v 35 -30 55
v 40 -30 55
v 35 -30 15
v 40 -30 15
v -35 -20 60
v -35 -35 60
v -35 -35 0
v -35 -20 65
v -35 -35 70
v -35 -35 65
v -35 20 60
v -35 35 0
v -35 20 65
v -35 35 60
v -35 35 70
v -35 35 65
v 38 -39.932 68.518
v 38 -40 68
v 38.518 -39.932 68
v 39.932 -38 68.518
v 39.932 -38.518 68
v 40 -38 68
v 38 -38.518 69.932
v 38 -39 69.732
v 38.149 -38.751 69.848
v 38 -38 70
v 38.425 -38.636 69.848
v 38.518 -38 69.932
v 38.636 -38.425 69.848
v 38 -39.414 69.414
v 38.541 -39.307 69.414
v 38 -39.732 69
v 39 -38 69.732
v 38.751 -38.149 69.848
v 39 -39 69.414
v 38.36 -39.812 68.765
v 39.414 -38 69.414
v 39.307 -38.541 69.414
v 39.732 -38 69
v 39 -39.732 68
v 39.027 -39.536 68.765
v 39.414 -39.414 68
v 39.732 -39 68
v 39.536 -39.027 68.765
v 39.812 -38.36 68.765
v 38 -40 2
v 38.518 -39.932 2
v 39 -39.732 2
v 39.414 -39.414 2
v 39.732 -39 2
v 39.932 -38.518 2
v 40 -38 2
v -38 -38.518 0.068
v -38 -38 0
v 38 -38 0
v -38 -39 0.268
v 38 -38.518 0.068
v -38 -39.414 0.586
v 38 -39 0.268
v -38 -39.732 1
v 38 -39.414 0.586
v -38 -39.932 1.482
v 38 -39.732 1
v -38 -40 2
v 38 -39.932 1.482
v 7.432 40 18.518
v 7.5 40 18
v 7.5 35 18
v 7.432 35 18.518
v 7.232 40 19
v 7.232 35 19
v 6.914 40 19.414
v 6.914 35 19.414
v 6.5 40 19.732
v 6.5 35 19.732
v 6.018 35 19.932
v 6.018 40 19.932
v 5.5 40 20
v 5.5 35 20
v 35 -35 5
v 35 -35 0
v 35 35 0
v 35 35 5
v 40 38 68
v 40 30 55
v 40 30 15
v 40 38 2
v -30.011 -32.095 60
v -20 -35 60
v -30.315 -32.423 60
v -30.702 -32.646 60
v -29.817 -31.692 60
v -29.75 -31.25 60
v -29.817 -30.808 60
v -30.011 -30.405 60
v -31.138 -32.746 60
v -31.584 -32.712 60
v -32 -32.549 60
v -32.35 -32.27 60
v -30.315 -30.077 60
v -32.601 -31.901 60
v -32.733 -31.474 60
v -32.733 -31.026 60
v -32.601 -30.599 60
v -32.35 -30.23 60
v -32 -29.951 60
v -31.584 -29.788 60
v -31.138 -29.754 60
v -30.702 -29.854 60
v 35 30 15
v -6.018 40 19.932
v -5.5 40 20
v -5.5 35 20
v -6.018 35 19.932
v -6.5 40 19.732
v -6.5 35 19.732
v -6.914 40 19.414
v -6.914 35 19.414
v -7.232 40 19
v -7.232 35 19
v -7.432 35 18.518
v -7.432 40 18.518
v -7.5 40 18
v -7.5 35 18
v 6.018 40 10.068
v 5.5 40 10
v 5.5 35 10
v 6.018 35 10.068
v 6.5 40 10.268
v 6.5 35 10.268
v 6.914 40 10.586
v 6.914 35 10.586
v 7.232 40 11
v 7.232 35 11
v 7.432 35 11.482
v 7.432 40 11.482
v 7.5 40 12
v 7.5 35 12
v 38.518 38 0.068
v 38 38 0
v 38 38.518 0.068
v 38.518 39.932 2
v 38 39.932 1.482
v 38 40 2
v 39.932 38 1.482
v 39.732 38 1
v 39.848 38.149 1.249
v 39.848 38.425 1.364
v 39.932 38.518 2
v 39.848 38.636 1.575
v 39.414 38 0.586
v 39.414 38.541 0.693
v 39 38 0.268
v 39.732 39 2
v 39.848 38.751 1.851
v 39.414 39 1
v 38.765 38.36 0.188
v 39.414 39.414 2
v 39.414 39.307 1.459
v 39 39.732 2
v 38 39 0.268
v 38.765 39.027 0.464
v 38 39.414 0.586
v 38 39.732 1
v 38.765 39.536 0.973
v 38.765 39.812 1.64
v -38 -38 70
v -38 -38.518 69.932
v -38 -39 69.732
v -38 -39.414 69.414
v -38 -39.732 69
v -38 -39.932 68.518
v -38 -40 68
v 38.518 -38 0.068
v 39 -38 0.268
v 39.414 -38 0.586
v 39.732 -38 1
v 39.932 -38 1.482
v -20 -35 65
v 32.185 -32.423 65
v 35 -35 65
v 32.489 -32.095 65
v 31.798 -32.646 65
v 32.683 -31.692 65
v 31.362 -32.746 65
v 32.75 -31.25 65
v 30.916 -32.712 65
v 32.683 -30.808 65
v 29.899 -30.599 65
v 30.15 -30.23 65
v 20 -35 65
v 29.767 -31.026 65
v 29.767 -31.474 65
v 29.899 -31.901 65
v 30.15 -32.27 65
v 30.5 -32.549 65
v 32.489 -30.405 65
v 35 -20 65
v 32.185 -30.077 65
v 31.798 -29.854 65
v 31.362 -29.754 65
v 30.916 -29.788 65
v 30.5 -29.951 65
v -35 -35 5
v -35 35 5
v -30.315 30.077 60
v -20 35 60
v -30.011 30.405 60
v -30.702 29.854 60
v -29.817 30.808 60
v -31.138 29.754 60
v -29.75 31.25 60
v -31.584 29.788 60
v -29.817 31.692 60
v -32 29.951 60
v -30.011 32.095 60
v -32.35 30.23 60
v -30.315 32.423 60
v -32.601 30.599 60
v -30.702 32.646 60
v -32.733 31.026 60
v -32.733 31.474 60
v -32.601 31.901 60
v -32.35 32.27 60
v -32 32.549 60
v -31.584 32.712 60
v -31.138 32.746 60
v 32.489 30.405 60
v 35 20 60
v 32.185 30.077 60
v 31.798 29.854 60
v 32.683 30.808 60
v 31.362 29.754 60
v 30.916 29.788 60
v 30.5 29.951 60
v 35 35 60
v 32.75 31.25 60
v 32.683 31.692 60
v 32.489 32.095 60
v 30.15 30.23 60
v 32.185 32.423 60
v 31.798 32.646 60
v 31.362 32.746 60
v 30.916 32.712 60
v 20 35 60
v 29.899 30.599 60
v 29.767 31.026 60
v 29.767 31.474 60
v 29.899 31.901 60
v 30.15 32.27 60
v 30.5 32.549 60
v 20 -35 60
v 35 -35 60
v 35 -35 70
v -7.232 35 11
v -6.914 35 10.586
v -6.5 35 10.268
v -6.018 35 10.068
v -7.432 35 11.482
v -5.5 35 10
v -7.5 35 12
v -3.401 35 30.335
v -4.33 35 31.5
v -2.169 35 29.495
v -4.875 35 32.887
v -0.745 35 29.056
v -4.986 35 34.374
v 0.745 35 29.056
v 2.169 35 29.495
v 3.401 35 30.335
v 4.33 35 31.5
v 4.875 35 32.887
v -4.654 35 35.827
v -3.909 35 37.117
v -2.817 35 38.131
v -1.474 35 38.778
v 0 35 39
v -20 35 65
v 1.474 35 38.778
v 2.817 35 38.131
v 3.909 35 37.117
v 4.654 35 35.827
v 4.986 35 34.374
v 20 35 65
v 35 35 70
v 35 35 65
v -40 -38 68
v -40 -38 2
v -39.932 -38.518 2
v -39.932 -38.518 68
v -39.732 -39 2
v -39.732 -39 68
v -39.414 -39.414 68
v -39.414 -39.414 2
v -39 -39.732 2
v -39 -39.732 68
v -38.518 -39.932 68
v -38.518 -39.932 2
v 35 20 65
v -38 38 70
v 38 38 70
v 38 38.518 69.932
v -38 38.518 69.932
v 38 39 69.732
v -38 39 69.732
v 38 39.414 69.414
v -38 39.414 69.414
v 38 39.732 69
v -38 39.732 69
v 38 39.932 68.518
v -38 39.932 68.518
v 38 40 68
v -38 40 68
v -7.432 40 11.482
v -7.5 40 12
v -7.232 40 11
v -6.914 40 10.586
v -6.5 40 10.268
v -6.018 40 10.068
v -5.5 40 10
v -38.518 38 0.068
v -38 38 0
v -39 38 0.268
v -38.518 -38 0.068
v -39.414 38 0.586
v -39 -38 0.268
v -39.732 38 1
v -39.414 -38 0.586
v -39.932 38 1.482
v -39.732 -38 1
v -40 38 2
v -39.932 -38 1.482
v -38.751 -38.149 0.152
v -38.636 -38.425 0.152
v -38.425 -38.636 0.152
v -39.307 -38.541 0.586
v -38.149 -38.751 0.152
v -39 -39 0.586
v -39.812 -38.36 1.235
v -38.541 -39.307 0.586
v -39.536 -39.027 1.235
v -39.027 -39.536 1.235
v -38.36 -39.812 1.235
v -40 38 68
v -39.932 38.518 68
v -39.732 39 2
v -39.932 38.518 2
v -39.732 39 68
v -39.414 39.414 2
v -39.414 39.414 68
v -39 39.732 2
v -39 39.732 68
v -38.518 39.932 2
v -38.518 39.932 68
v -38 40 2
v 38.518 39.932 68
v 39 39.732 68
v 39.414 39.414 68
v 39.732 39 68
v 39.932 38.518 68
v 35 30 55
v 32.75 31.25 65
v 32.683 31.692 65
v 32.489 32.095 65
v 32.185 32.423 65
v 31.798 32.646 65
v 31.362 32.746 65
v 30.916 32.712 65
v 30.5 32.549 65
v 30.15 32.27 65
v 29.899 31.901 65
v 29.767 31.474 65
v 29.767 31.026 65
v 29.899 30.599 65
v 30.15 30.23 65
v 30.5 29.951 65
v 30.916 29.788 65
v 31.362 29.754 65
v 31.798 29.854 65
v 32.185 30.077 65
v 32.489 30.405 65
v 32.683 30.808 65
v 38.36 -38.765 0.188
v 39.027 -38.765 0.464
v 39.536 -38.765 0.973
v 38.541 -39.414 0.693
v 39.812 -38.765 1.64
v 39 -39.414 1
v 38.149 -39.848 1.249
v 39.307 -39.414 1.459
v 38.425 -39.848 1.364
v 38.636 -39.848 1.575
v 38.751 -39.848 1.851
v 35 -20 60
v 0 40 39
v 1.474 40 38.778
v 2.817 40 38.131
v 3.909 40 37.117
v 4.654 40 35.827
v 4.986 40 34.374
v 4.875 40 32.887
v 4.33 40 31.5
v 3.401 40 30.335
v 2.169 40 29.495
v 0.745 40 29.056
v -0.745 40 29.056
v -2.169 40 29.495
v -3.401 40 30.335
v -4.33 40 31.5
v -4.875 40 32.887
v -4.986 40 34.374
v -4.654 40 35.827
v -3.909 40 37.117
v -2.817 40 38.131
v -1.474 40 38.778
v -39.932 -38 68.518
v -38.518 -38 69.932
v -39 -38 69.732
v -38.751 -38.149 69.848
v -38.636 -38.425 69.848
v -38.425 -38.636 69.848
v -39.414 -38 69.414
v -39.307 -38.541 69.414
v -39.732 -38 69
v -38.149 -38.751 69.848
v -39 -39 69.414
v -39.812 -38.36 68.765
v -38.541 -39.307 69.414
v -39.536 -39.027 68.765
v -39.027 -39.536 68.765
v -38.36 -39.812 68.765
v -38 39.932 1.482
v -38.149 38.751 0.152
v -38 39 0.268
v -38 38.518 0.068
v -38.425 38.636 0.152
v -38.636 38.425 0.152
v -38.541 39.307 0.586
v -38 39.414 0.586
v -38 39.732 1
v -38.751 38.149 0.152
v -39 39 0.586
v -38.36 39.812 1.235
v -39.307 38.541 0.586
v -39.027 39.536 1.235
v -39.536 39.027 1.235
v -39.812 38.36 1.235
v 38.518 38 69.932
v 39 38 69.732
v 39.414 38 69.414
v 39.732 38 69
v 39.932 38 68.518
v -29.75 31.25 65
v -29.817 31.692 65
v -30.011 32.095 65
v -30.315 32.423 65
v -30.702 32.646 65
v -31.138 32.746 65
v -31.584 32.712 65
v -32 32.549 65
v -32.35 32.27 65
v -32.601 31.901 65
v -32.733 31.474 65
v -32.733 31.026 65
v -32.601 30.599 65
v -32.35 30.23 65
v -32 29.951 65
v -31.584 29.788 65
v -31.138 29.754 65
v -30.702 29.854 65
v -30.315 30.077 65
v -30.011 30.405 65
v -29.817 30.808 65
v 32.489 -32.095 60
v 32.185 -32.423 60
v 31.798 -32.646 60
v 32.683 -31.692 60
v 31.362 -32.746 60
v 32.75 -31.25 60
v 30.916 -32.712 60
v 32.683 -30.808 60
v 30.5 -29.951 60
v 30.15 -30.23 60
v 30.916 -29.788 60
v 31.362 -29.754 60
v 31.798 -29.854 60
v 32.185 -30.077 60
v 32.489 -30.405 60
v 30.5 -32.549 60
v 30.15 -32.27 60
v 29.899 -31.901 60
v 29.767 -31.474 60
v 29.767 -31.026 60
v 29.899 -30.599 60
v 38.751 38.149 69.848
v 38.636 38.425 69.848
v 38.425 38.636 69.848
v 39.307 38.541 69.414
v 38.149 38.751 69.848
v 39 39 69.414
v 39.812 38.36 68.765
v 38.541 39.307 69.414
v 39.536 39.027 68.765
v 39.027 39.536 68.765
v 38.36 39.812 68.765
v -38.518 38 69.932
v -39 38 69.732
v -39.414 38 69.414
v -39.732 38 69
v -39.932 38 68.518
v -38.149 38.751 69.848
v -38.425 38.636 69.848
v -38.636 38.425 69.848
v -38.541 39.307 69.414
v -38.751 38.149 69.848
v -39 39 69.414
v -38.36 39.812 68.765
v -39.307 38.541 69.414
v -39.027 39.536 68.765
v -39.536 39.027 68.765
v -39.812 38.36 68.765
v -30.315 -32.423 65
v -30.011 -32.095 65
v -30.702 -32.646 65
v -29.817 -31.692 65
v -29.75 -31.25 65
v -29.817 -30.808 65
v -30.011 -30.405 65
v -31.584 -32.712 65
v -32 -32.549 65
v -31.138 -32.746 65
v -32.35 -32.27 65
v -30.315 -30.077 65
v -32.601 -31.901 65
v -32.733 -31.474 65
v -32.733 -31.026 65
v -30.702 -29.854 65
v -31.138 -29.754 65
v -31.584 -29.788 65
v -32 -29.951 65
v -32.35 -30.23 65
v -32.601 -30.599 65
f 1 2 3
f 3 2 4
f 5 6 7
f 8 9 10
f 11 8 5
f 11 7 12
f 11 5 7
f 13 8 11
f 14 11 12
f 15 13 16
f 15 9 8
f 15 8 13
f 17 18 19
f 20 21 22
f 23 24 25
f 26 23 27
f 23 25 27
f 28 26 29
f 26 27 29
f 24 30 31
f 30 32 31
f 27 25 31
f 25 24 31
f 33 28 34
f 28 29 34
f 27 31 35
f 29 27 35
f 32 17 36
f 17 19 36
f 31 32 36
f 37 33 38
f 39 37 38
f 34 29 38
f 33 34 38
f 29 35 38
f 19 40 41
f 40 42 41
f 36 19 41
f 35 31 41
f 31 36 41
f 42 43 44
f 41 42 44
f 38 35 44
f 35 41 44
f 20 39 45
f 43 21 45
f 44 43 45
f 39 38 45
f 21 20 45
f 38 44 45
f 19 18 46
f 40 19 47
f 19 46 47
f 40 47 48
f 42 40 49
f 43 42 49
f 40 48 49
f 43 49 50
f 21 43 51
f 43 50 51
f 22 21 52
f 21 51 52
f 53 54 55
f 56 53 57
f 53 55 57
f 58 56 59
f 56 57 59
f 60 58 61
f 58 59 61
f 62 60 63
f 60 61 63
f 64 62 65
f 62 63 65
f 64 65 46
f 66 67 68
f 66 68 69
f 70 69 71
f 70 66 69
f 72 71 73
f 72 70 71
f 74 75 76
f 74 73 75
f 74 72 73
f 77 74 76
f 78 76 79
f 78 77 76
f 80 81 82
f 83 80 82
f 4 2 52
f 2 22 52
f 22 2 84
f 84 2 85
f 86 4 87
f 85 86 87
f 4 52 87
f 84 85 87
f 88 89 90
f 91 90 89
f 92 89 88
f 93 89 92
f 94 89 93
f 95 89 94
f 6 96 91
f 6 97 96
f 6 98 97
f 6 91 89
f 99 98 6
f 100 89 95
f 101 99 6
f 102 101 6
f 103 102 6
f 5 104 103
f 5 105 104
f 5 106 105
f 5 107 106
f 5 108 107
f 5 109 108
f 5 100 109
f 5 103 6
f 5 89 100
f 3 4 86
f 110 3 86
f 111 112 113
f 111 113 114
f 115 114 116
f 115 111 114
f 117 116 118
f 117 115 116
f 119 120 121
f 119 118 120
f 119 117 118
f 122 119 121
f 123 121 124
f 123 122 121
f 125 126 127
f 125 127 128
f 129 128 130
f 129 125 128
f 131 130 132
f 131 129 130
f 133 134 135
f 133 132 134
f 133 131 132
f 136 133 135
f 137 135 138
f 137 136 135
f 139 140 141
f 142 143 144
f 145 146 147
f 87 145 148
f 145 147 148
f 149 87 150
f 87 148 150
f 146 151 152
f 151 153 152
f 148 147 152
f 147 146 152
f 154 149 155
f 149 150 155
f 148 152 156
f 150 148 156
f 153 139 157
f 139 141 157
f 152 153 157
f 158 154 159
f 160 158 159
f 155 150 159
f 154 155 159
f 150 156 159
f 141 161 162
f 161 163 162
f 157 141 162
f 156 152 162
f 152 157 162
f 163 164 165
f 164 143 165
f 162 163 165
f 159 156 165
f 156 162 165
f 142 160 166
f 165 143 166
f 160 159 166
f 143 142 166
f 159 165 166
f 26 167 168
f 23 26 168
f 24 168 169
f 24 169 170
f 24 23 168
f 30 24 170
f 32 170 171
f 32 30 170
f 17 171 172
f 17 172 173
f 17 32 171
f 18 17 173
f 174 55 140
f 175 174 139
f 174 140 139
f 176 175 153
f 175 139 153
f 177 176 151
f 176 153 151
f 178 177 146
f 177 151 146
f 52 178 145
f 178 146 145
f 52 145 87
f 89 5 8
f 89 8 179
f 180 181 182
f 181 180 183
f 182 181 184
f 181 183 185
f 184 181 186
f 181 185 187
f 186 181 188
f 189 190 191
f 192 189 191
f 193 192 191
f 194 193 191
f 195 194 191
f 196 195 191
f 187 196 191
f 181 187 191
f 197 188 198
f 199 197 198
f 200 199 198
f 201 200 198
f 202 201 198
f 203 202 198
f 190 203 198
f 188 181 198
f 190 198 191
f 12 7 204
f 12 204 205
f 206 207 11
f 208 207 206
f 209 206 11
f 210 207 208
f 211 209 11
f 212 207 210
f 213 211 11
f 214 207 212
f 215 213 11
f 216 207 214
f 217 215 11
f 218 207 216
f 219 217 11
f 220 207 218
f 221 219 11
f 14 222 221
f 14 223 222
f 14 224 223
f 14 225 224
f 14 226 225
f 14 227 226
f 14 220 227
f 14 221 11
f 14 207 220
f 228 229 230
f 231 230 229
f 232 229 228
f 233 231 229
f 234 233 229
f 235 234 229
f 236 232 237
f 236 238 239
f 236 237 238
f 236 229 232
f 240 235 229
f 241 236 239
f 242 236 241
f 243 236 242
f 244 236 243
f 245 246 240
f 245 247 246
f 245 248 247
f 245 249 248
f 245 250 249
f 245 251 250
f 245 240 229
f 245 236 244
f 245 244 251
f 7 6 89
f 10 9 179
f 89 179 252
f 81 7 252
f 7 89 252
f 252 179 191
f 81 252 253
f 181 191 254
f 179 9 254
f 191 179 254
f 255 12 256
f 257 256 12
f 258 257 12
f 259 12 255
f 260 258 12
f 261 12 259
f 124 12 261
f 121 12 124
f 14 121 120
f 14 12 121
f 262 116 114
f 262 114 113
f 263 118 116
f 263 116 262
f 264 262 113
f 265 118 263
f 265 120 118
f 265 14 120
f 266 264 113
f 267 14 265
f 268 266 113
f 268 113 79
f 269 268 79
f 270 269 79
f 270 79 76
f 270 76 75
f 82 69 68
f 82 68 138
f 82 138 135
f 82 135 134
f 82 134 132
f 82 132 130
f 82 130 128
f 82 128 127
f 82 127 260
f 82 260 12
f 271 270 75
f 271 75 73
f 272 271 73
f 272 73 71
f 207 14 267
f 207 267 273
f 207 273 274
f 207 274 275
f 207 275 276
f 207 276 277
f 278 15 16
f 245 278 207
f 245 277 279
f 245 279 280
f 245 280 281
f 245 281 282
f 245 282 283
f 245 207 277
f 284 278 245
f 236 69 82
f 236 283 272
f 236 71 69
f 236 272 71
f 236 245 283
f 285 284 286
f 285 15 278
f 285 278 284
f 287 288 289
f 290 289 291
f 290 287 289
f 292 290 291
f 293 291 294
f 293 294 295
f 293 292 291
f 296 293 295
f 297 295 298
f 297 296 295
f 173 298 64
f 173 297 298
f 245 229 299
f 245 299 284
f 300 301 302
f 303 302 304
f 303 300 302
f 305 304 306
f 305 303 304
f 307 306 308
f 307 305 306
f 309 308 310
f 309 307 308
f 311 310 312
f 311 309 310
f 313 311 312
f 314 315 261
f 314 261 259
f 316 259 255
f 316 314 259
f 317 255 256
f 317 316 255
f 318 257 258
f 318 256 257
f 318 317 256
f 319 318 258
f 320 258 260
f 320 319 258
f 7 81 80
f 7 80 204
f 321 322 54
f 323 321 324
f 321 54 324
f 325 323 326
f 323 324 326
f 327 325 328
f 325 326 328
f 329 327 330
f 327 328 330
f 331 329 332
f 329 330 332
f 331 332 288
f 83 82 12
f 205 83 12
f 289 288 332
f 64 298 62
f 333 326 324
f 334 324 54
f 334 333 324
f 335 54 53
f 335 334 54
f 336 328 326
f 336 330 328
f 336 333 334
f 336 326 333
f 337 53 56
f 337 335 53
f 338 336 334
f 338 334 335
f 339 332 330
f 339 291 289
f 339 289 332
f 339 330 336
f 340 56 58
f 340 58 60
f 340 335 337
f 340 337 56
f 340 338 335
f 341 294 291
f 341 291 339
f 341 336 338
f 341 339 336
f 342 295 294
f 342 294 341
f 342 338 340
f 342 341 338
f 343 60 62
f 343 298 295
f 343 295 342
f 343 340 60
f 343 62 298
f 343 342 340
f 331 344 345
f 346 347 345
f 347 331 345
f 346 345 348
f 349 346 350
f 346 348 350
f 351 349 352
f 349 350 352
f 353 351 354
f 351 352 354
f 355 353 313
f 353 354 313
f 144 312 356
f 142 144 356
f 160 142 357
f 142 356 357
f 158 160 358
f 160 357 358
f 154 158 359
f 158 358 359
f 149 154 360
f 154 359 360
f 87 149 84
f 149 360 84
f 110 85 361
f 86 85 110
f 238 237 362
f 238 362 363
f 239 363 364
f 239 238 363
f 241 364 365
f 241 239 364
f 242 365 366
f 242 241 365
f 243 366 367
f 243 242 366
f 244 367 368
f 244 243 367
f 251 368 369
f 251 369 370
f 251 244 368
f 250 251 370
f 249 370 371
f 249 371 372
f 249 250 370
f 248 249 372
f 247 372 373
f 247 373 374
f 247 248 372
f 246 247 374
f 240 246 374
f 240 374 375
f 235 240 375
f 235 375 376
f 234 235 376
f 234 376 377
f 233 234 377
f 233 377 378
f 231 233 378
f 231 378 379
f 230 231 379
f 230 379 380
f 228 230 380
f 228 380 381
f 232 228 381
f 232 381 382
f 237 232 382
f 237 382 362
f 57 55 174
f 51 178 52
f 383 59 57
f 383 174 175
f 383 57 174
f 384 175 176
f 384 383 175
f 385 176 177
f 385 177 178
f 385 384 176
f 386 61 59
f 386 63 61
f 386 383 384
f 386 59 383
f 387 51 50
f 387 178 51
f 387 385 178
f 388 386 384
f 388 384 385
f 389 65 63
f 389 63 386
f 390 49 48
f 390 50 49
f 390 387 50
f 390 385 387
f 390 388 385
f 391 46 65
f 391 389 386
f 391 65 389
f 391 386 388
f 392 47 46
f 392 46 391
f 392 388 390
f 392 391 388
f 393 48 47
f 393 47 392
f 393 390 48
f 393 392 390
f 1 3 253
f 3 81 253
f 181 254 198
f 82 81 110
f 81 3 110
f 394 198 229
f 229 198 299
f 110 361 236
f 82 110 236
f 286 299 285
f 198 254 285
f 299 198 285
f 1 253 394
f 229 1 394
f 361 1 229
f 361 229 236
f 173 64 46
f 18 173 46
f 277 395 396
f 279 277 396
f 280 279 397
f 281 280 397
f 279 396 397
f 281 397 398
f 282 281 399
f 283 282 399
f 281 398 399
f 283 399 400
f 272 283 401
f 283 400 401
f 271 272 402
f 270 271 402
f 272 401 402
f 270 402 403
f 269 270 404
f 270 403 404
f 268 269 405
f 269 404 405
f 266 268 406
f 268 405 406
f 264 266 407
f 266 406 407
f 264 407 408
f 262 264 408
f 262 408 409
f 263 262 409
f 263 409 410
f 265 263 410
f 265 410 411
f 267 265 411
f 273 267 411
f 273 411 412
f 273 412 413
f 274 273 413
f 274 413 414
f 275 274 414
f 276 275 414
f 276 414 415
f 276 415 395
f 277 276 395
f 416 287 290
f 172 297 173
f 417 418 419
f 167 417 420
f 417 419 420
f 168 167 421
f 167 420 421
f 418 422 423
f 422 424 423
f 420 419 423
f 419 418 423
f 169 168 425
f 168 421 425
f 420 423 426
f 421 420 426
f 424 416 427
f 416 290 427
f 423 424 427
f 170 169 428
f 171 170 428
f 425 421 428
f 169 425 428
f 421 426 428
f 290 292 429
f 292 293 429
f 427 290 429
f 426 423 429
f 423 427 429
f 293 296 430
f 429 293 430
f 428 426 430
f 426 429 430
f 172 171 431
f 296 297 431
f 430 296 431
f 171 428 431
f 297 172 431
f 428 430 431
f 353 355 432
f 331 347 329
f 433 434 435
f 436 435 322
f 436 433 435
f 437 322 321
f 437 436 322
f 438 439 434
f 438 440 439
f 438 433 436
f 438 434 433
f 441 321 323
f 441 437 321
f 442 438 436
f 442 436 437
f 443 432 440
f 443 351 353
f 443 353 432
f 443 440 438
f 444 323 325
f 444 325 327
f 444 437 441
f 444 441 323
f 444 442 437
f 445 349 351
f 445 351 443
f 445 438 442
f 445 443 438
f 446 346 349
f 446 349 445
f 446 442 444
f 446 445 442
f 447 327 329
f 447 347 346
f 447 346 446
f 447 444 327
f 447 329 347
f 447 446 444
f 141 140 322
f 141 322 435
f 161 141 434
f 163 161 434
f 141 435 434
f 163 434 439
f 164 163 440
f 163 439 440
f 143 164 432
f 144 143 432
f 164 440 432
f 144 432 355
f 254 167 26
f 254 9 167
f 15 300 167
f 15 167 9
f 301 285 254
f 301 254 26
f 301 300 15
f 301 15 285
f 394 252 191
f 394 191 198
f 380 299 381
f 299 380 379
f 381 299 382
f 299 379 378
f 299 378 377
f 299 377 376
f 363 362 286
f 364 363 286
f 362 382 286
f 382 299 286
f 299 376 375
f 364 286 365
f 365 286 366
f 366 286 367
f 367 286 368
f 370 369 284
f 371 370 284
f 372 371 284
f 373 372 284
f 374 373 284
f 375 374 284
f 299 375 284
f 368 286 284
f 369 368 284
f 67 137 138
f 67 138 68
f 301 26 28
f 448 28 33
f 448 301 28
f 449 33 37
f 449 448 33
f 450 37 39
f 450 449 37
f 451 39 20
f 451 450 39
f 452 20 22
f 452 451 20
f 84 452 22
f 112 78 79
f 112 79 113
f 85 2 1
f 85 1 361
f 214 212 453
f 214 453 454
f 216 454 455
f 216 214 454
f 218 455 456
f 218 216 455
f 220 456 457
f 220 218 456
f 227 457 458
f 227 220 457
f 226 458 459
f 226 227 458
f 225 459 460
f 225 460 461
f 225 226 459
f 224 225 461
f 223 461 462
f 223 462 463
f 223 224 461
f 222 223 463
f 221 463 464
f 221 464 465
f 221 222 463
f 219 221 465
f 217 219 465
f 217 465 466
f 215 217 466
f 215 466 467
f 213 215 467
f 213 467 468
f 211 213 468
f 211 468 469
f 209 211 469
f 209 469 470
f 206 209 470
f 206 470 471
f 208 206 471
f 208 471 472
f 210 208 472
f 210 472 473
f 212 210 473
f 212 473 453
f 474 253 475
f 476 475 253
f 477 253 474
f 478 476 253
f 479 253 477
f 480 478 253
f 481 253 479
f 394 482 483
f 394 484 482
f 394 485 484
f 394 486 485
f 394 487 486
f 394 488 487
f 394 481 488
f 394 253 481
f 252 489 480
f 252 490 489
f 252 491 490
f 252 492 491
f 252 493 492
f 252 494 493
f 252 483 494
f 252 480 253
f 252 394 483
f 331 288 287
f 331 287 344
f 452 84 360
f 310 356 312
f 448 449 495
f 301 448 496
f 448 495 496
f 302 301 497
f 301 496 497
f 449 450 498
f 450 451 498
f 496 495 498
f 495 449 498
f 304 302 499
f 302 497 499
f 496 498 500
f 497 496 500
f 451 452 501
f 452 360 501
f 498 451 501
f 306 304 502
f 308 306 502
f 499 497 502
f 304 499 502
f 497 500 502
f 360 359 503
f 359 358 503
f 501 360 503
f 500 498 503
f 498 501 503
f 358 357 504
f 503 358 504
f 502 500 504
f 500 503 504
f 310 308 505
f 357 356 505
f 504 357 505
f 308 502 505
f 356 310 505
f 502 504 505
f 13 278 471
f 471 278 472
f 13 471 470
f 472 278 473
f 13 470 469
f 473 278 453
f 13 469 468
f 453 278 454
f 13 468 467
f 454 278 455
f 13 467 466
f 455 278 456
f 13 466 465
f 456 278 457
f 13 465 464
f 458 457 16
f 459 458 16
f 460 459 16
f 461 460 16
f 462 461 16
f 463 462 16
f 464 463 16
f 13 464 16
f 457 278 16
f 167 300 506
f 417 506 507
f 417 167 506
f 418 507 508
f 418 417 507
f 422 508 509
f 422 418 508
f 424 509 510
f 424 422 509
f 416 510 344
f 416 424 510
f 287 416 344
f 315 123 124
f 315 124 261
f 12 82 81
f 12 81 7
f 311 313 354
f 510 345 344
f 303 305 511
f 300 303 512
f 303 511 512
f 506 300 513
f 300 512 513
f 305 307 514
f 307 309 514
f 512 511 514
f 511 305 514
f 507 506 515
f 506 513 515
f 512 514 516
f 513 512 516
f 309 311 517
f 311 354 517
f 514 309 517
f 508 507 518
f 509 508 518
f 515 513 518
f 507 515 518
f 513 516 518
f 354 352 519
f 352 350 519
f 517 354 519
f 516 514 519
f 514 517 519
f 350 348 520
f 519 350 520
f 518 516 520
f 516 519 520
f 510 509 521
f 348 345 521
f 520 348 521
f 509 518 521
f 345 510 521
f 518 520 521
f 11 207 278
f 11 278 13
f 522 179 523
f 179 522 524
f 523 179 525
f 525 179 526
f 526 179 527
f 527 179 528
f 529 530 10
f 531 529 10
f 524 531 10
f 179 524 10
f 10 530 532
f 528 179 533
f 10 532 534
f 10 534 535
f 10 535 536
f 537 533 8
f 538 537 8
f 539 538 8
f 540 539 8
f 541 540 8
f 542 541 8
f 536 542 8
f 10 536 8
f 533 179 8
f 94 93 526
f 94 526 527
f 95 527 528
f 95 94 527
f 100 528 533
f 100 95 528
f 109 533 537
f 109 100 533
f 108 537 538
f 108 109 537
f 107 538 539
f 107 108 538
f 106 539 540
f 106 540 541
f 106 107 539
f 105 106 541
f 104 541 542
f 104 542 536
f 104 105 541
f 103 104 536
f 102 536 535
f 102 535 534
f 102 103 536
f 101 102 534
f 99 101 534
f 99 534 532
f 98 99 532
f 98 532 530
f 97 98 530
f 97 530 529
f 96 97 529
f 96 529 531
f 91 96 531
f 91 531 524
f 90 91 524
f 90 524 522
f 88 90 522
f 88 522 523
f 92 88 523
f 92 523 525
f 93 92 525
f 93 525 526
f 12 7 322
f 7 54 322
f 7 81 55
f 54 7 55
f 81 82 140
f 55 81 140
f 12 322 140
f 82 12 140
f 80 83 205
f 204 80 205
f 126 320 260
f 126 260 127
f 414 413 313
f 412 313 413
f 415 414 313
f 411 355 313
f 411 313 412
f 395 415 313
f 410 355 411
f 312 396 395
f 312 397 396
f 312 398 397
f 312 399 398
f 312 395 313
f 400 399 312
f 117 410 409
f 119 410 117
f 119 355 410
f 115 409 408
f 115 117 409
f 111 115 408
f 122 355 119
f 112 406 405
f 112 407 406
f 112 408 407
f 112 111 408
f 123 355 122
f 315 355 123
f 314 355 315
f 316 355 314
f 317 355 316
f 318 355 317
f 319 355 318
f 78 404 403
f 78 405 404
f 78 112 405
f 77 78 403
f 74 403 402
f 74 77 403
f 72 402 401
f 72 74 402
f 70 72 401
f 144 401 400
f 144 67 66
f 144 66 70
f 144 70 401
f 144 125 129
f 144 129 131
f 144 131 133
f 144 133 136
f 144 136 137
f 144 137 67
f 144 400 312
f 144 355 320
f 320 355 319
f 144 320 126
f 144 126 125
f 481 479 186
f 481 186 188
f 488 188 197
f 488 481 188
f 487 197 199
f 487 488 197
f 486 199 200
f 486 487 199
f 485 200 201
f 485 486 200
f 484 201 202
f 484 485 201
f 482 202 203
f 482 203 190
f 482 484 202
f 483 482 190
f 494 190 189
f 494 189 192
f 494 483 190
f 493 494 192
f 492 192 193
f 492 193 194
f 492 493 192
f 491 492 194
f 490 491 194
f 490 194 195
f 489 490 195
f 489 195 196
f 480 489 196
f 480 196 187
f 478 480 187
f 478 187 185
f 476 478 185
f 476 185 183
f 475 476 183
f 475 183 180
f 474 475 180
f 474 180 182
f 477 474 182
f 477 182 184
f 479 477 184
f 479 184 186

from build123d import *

# Parameters (mm, degrees)
SKETCH_1_W          = 80
SKETCH_1_H          = 80
EXTRUDE_1_DEPTH     = 70
SKETCH_2_W          = 70
SKETCH_2_H          = 70
CUT_EXTRUDE_1_DEPTH = 65
FILLET_1_R          = 2
FILLET_2_R          = 2
FILLET_3_R          = 2
CUT_EXTRUDE_3_DEPTH = 10
SKETCH_4_W          = 10
SKETCH_4_H          = 30
CUT_EXTRUDE_4_DEPTH = 10
SKETCH_5_R          = 5
CUT_EXTRUDE_5_DEPTH = 10
FILLET_4_R          = 2
SKETCH_6_W          = 40
SKETCH_6_H          = 60
CUT_EXTRUDE_6_DEPTH = 10
SKETCH_7_R          = 1.5
EXTRUDE_2_DEPTH     = 60
SKETCH_8_W          = 70
SKETCH_8_H          = 70
CUT_EXTRUDE_7_DEPTH = 60
SKETCH_9_W          = 70
SKETCH_9_H          = 70
EXTRUDE_3_DEPTH     = 5


with BuildPart() as part:
    # Эскиз1 → Бобышка-Вытянуть1 (new body)
    with BuildSketch(Plane.XY):
        Rectangle(SKETCH_1_W, SKETCH_1_H)
    extrude(amount=EXTRUDE_1_DEPTH)

    # Эскиз2 → Вырез-Вытянуть1 (cut)
    with BuildSketch(Plane.XY.offset(70)):
        Rectangle(SKETCH_2_W, SKETCH_2_H)
    extrude(amount=-CUT_EXTRUDE_1_DEPTH, mode=Mode.SUBTRACT)

    # Скругление1
    fillet_1_edges = [part.edges().sort_by_distance(p)[0] for p in [
        (-40, 40, 35),
        (-40, -40, 35),
    ]]
    fillet(fillet_1_edges, radius=FILLET_1_R)

    # Скругление2
    fillet_2_edges = [part.edges().sort_by_distance(p)[0] for p in [
        (1, -40, 0),
        (-40, 0, 0),
        (-39.414213562, 39.414213562, 0),
        (-39.414213562, -39.414213562, 0),
        (1, 40, 0),
        (40, 0, 0),
        (40, 40, 35),
    ]]
    fillet(fillet_2_edges, radius=FILLET_2_R)

    # Скругление3
    # the kernel refuses this fillet: 2 mm, written as the material it takes off along each edge
    with BuildSketch(Plane(origin=(38, -38, 2), x_dir=(1, 0, 0), z_dir=(0, -1, 0))) as fillet_3_piece_1_section:
        Polygon((0, 0), (FILLET_3_R, 0), (FILLET_3_R, -FILLET_3_R), (0, -FILLET_3_R), align=None)
    fillet_3_piece_1 = extrude(amount=FILLET_3_R, mode=Mode.PRIVATE)
    fillet_3_piece_1 = fillet_3_piece_1 - Plane(origin=(38, -38, 2), x_dir=(-0.7071067811865475, 0, 0.7071067811865475), z_dir=(0, -1, 0)) * Sphere(FILLET_3_R, mode=Mode.PRIVATE)
    add(fillet_3_piece_1, mode=Mode.SUBTRACT)
    with BuildSketch(Plane(origin=(40, -40, 2), x_dir=(-1, 0, 0), z_dir=(0, 0, 1))) as fillet_3_piece_2:
        with BuildLine():
            CenterArc((FILLET_3_R, -FILLET_3_R), FILLET_3_R, 90, 90)
            Line((0, -FILLET_3_R), (0, 0))
            Line((0, 0), (FILLET_3_R, 0))
        make_face()
    extrude(amount=73, mode=Mode.SUBTRACT)

    # Эскиз3 → Вырез-Вытянуть3 (cut)
    with BuildSketch(Plane(origin=(0, 40, 0), x_dir=(1, 0, 0), z_dir=(0, 1, 0))):
        with BuildLine():
            Line((5.5, -20), (-5.5, -20))
            ThreePointArc((-5.5, -20), (-6.914213562, -19.414213562), (-7.5, -18))
            Line((-7.5, -18), (-7.5, -12))
            ThreePointArc((-7.5, -12), (-6.914213562, -10.585786438), (-5.5, -10))
            Line((-5.5, -10), (5.5, -10))
            ThreePointArc((5.5, -10), (6.914213562, -10.585786438), (7.5, -12))
            Line((7.5, -12), (7.5, -18))
            ThreePointArc((7.5, -18), (6.914213562, -19.414213562), (5.5, -20))
        make_face()
    extrude(amount=-CUT_EXTRUDE_3_DEPTH, mode=Mode.SUBTRACT)

    # Эскиз4 → Вырез-Вытянуть4 (cut)
    with BuildSketch(Plane(origin=(40, 0, 0), x_dir=(0, 0, -1), z_dir=(1, 0, 0))):
        with Locations((-36, 0)):
            Rectangle(SKETCH_4_W, SKETCH_4_H)
    extrude(amount=-CUT_EXTRUDE_4_DEPTH, mode=Mode.SUBTRACT)

    # Эскиз5 → Вырез-Вытянуть5 (cut)
    with BuildSketch(Plane(origin=(0, 40, 0), x_dir=(1, 0, 0), z_dir=(0, 1, 0))):
        with Locations(Location((0, -34, 0), (0, 0, 270))):
            Circle(SKETCH_5_R)
    extrude(amount=-CUT_EXTRUDE_5_DEPTH, mode=Mode.SUBTRACT)

    # Скругление4
    fillet_4_edges = [part.edges().sort_by_distance(p)[0] for p in [
        (0, -40, 70),
        (-40, 0, 70),
        (-39.414213562, 39.414213562, 70),
        (-39.414213562, -39.414213562, 70),
        (0, 40, 70),
        (39.414213562, 39.414213562, 70),
        (40, 0, 70),
        (39.414213562, -39.414213562, 70),
    ]]
    fillet(fillet_4_edges, radius=FILLET_4_R)

    # Эскиз6 → Вырез-Вытянуть6 (cut)
    with BuildSketch(Plane(origin=(40, 0, 0), x_dir=(0, 0, -1), z_dir=(1, 0, 0))):
        with Locations((-35, 0)):
            Rectangle(SKETCH_6_W, SKETCH_6_H)
    extrude(amount=-CUT_EXTRUDE_6_DEPTH, mode=Mode.SUBTRACT)

    # Эскиз7 → Бобышка-Вытянуть2 (add)
    # profile 1 of 4: a face of its own
    with BuildSketch(Plane.XY.offset(5)):
        Polygon((-20, 35), (-35, 20), (-35, 35), align=None)
        with Locations((-31.25, 31.25)):
            Circle(SKETCH_7_R, mode=Mode.SUBTRACT)
    # profile 2 of 4: a face of its own
    with BuildSketch(Plane.XY.offset(5)):
        Polygon((35, 20), (20, 35), (35, 35), align=None)
        with Locations((31.25, 31.25)):
            Circle(SKETCH_7_R, mode=Mode.SUBTRACT)
    # profile 3 of 4: a face of its own
    with BuildSketch(Plane.XY.offset(5)):
        Polygon((20, -35), (35, -20), (35, -35), align=None)
        with Locations((31.25, -31.25)):
            Circle(SKETCH_7_R, mode=Mode.SUBTRACT)
    # profile 4 of 4: a face of its own
    with BuildSketch(Plane.XY.offset(5)):
        Polygon((-35, -20), (-20, -35), (-35, -35), align=None)
        with Locations((-31.25, -31.25)):
            Circle(SKETCH_7_R, mode=Mode.SUBTRACT)
    extrude(amount=EXTRUDE_2_DEPTH)

    # Эскиз8 → Вырез-Вытянуть7 (cut)
    with BuildSketch(Plane(origin=(0, 0, 0), x_dir=(-1, 0, 0), z_dir=(0, 0, -1))):
        Rectangle(SKETCH_8_W, SKETCH_8_H)
    extrude(amount=-CUT_EXTRUDE_7_DEPTH, mode=Mode.SUBTRACT)


with BuildPart() as body_2:
    # Эскиз9 → Бобышка-Вытянуть3 (new body)
    with BuildSketch(Plane(origin=(0, 0, 0), x_dir=(-1, 0, 0), z_dir=(0, 0, -1))):
        Rectangle(SKETCH_9_W, SKETCH_9_H)
    extrude(amount=-EXTRUDE_3_DEPTH)


solid = Compound([part.part, body_2.part])
